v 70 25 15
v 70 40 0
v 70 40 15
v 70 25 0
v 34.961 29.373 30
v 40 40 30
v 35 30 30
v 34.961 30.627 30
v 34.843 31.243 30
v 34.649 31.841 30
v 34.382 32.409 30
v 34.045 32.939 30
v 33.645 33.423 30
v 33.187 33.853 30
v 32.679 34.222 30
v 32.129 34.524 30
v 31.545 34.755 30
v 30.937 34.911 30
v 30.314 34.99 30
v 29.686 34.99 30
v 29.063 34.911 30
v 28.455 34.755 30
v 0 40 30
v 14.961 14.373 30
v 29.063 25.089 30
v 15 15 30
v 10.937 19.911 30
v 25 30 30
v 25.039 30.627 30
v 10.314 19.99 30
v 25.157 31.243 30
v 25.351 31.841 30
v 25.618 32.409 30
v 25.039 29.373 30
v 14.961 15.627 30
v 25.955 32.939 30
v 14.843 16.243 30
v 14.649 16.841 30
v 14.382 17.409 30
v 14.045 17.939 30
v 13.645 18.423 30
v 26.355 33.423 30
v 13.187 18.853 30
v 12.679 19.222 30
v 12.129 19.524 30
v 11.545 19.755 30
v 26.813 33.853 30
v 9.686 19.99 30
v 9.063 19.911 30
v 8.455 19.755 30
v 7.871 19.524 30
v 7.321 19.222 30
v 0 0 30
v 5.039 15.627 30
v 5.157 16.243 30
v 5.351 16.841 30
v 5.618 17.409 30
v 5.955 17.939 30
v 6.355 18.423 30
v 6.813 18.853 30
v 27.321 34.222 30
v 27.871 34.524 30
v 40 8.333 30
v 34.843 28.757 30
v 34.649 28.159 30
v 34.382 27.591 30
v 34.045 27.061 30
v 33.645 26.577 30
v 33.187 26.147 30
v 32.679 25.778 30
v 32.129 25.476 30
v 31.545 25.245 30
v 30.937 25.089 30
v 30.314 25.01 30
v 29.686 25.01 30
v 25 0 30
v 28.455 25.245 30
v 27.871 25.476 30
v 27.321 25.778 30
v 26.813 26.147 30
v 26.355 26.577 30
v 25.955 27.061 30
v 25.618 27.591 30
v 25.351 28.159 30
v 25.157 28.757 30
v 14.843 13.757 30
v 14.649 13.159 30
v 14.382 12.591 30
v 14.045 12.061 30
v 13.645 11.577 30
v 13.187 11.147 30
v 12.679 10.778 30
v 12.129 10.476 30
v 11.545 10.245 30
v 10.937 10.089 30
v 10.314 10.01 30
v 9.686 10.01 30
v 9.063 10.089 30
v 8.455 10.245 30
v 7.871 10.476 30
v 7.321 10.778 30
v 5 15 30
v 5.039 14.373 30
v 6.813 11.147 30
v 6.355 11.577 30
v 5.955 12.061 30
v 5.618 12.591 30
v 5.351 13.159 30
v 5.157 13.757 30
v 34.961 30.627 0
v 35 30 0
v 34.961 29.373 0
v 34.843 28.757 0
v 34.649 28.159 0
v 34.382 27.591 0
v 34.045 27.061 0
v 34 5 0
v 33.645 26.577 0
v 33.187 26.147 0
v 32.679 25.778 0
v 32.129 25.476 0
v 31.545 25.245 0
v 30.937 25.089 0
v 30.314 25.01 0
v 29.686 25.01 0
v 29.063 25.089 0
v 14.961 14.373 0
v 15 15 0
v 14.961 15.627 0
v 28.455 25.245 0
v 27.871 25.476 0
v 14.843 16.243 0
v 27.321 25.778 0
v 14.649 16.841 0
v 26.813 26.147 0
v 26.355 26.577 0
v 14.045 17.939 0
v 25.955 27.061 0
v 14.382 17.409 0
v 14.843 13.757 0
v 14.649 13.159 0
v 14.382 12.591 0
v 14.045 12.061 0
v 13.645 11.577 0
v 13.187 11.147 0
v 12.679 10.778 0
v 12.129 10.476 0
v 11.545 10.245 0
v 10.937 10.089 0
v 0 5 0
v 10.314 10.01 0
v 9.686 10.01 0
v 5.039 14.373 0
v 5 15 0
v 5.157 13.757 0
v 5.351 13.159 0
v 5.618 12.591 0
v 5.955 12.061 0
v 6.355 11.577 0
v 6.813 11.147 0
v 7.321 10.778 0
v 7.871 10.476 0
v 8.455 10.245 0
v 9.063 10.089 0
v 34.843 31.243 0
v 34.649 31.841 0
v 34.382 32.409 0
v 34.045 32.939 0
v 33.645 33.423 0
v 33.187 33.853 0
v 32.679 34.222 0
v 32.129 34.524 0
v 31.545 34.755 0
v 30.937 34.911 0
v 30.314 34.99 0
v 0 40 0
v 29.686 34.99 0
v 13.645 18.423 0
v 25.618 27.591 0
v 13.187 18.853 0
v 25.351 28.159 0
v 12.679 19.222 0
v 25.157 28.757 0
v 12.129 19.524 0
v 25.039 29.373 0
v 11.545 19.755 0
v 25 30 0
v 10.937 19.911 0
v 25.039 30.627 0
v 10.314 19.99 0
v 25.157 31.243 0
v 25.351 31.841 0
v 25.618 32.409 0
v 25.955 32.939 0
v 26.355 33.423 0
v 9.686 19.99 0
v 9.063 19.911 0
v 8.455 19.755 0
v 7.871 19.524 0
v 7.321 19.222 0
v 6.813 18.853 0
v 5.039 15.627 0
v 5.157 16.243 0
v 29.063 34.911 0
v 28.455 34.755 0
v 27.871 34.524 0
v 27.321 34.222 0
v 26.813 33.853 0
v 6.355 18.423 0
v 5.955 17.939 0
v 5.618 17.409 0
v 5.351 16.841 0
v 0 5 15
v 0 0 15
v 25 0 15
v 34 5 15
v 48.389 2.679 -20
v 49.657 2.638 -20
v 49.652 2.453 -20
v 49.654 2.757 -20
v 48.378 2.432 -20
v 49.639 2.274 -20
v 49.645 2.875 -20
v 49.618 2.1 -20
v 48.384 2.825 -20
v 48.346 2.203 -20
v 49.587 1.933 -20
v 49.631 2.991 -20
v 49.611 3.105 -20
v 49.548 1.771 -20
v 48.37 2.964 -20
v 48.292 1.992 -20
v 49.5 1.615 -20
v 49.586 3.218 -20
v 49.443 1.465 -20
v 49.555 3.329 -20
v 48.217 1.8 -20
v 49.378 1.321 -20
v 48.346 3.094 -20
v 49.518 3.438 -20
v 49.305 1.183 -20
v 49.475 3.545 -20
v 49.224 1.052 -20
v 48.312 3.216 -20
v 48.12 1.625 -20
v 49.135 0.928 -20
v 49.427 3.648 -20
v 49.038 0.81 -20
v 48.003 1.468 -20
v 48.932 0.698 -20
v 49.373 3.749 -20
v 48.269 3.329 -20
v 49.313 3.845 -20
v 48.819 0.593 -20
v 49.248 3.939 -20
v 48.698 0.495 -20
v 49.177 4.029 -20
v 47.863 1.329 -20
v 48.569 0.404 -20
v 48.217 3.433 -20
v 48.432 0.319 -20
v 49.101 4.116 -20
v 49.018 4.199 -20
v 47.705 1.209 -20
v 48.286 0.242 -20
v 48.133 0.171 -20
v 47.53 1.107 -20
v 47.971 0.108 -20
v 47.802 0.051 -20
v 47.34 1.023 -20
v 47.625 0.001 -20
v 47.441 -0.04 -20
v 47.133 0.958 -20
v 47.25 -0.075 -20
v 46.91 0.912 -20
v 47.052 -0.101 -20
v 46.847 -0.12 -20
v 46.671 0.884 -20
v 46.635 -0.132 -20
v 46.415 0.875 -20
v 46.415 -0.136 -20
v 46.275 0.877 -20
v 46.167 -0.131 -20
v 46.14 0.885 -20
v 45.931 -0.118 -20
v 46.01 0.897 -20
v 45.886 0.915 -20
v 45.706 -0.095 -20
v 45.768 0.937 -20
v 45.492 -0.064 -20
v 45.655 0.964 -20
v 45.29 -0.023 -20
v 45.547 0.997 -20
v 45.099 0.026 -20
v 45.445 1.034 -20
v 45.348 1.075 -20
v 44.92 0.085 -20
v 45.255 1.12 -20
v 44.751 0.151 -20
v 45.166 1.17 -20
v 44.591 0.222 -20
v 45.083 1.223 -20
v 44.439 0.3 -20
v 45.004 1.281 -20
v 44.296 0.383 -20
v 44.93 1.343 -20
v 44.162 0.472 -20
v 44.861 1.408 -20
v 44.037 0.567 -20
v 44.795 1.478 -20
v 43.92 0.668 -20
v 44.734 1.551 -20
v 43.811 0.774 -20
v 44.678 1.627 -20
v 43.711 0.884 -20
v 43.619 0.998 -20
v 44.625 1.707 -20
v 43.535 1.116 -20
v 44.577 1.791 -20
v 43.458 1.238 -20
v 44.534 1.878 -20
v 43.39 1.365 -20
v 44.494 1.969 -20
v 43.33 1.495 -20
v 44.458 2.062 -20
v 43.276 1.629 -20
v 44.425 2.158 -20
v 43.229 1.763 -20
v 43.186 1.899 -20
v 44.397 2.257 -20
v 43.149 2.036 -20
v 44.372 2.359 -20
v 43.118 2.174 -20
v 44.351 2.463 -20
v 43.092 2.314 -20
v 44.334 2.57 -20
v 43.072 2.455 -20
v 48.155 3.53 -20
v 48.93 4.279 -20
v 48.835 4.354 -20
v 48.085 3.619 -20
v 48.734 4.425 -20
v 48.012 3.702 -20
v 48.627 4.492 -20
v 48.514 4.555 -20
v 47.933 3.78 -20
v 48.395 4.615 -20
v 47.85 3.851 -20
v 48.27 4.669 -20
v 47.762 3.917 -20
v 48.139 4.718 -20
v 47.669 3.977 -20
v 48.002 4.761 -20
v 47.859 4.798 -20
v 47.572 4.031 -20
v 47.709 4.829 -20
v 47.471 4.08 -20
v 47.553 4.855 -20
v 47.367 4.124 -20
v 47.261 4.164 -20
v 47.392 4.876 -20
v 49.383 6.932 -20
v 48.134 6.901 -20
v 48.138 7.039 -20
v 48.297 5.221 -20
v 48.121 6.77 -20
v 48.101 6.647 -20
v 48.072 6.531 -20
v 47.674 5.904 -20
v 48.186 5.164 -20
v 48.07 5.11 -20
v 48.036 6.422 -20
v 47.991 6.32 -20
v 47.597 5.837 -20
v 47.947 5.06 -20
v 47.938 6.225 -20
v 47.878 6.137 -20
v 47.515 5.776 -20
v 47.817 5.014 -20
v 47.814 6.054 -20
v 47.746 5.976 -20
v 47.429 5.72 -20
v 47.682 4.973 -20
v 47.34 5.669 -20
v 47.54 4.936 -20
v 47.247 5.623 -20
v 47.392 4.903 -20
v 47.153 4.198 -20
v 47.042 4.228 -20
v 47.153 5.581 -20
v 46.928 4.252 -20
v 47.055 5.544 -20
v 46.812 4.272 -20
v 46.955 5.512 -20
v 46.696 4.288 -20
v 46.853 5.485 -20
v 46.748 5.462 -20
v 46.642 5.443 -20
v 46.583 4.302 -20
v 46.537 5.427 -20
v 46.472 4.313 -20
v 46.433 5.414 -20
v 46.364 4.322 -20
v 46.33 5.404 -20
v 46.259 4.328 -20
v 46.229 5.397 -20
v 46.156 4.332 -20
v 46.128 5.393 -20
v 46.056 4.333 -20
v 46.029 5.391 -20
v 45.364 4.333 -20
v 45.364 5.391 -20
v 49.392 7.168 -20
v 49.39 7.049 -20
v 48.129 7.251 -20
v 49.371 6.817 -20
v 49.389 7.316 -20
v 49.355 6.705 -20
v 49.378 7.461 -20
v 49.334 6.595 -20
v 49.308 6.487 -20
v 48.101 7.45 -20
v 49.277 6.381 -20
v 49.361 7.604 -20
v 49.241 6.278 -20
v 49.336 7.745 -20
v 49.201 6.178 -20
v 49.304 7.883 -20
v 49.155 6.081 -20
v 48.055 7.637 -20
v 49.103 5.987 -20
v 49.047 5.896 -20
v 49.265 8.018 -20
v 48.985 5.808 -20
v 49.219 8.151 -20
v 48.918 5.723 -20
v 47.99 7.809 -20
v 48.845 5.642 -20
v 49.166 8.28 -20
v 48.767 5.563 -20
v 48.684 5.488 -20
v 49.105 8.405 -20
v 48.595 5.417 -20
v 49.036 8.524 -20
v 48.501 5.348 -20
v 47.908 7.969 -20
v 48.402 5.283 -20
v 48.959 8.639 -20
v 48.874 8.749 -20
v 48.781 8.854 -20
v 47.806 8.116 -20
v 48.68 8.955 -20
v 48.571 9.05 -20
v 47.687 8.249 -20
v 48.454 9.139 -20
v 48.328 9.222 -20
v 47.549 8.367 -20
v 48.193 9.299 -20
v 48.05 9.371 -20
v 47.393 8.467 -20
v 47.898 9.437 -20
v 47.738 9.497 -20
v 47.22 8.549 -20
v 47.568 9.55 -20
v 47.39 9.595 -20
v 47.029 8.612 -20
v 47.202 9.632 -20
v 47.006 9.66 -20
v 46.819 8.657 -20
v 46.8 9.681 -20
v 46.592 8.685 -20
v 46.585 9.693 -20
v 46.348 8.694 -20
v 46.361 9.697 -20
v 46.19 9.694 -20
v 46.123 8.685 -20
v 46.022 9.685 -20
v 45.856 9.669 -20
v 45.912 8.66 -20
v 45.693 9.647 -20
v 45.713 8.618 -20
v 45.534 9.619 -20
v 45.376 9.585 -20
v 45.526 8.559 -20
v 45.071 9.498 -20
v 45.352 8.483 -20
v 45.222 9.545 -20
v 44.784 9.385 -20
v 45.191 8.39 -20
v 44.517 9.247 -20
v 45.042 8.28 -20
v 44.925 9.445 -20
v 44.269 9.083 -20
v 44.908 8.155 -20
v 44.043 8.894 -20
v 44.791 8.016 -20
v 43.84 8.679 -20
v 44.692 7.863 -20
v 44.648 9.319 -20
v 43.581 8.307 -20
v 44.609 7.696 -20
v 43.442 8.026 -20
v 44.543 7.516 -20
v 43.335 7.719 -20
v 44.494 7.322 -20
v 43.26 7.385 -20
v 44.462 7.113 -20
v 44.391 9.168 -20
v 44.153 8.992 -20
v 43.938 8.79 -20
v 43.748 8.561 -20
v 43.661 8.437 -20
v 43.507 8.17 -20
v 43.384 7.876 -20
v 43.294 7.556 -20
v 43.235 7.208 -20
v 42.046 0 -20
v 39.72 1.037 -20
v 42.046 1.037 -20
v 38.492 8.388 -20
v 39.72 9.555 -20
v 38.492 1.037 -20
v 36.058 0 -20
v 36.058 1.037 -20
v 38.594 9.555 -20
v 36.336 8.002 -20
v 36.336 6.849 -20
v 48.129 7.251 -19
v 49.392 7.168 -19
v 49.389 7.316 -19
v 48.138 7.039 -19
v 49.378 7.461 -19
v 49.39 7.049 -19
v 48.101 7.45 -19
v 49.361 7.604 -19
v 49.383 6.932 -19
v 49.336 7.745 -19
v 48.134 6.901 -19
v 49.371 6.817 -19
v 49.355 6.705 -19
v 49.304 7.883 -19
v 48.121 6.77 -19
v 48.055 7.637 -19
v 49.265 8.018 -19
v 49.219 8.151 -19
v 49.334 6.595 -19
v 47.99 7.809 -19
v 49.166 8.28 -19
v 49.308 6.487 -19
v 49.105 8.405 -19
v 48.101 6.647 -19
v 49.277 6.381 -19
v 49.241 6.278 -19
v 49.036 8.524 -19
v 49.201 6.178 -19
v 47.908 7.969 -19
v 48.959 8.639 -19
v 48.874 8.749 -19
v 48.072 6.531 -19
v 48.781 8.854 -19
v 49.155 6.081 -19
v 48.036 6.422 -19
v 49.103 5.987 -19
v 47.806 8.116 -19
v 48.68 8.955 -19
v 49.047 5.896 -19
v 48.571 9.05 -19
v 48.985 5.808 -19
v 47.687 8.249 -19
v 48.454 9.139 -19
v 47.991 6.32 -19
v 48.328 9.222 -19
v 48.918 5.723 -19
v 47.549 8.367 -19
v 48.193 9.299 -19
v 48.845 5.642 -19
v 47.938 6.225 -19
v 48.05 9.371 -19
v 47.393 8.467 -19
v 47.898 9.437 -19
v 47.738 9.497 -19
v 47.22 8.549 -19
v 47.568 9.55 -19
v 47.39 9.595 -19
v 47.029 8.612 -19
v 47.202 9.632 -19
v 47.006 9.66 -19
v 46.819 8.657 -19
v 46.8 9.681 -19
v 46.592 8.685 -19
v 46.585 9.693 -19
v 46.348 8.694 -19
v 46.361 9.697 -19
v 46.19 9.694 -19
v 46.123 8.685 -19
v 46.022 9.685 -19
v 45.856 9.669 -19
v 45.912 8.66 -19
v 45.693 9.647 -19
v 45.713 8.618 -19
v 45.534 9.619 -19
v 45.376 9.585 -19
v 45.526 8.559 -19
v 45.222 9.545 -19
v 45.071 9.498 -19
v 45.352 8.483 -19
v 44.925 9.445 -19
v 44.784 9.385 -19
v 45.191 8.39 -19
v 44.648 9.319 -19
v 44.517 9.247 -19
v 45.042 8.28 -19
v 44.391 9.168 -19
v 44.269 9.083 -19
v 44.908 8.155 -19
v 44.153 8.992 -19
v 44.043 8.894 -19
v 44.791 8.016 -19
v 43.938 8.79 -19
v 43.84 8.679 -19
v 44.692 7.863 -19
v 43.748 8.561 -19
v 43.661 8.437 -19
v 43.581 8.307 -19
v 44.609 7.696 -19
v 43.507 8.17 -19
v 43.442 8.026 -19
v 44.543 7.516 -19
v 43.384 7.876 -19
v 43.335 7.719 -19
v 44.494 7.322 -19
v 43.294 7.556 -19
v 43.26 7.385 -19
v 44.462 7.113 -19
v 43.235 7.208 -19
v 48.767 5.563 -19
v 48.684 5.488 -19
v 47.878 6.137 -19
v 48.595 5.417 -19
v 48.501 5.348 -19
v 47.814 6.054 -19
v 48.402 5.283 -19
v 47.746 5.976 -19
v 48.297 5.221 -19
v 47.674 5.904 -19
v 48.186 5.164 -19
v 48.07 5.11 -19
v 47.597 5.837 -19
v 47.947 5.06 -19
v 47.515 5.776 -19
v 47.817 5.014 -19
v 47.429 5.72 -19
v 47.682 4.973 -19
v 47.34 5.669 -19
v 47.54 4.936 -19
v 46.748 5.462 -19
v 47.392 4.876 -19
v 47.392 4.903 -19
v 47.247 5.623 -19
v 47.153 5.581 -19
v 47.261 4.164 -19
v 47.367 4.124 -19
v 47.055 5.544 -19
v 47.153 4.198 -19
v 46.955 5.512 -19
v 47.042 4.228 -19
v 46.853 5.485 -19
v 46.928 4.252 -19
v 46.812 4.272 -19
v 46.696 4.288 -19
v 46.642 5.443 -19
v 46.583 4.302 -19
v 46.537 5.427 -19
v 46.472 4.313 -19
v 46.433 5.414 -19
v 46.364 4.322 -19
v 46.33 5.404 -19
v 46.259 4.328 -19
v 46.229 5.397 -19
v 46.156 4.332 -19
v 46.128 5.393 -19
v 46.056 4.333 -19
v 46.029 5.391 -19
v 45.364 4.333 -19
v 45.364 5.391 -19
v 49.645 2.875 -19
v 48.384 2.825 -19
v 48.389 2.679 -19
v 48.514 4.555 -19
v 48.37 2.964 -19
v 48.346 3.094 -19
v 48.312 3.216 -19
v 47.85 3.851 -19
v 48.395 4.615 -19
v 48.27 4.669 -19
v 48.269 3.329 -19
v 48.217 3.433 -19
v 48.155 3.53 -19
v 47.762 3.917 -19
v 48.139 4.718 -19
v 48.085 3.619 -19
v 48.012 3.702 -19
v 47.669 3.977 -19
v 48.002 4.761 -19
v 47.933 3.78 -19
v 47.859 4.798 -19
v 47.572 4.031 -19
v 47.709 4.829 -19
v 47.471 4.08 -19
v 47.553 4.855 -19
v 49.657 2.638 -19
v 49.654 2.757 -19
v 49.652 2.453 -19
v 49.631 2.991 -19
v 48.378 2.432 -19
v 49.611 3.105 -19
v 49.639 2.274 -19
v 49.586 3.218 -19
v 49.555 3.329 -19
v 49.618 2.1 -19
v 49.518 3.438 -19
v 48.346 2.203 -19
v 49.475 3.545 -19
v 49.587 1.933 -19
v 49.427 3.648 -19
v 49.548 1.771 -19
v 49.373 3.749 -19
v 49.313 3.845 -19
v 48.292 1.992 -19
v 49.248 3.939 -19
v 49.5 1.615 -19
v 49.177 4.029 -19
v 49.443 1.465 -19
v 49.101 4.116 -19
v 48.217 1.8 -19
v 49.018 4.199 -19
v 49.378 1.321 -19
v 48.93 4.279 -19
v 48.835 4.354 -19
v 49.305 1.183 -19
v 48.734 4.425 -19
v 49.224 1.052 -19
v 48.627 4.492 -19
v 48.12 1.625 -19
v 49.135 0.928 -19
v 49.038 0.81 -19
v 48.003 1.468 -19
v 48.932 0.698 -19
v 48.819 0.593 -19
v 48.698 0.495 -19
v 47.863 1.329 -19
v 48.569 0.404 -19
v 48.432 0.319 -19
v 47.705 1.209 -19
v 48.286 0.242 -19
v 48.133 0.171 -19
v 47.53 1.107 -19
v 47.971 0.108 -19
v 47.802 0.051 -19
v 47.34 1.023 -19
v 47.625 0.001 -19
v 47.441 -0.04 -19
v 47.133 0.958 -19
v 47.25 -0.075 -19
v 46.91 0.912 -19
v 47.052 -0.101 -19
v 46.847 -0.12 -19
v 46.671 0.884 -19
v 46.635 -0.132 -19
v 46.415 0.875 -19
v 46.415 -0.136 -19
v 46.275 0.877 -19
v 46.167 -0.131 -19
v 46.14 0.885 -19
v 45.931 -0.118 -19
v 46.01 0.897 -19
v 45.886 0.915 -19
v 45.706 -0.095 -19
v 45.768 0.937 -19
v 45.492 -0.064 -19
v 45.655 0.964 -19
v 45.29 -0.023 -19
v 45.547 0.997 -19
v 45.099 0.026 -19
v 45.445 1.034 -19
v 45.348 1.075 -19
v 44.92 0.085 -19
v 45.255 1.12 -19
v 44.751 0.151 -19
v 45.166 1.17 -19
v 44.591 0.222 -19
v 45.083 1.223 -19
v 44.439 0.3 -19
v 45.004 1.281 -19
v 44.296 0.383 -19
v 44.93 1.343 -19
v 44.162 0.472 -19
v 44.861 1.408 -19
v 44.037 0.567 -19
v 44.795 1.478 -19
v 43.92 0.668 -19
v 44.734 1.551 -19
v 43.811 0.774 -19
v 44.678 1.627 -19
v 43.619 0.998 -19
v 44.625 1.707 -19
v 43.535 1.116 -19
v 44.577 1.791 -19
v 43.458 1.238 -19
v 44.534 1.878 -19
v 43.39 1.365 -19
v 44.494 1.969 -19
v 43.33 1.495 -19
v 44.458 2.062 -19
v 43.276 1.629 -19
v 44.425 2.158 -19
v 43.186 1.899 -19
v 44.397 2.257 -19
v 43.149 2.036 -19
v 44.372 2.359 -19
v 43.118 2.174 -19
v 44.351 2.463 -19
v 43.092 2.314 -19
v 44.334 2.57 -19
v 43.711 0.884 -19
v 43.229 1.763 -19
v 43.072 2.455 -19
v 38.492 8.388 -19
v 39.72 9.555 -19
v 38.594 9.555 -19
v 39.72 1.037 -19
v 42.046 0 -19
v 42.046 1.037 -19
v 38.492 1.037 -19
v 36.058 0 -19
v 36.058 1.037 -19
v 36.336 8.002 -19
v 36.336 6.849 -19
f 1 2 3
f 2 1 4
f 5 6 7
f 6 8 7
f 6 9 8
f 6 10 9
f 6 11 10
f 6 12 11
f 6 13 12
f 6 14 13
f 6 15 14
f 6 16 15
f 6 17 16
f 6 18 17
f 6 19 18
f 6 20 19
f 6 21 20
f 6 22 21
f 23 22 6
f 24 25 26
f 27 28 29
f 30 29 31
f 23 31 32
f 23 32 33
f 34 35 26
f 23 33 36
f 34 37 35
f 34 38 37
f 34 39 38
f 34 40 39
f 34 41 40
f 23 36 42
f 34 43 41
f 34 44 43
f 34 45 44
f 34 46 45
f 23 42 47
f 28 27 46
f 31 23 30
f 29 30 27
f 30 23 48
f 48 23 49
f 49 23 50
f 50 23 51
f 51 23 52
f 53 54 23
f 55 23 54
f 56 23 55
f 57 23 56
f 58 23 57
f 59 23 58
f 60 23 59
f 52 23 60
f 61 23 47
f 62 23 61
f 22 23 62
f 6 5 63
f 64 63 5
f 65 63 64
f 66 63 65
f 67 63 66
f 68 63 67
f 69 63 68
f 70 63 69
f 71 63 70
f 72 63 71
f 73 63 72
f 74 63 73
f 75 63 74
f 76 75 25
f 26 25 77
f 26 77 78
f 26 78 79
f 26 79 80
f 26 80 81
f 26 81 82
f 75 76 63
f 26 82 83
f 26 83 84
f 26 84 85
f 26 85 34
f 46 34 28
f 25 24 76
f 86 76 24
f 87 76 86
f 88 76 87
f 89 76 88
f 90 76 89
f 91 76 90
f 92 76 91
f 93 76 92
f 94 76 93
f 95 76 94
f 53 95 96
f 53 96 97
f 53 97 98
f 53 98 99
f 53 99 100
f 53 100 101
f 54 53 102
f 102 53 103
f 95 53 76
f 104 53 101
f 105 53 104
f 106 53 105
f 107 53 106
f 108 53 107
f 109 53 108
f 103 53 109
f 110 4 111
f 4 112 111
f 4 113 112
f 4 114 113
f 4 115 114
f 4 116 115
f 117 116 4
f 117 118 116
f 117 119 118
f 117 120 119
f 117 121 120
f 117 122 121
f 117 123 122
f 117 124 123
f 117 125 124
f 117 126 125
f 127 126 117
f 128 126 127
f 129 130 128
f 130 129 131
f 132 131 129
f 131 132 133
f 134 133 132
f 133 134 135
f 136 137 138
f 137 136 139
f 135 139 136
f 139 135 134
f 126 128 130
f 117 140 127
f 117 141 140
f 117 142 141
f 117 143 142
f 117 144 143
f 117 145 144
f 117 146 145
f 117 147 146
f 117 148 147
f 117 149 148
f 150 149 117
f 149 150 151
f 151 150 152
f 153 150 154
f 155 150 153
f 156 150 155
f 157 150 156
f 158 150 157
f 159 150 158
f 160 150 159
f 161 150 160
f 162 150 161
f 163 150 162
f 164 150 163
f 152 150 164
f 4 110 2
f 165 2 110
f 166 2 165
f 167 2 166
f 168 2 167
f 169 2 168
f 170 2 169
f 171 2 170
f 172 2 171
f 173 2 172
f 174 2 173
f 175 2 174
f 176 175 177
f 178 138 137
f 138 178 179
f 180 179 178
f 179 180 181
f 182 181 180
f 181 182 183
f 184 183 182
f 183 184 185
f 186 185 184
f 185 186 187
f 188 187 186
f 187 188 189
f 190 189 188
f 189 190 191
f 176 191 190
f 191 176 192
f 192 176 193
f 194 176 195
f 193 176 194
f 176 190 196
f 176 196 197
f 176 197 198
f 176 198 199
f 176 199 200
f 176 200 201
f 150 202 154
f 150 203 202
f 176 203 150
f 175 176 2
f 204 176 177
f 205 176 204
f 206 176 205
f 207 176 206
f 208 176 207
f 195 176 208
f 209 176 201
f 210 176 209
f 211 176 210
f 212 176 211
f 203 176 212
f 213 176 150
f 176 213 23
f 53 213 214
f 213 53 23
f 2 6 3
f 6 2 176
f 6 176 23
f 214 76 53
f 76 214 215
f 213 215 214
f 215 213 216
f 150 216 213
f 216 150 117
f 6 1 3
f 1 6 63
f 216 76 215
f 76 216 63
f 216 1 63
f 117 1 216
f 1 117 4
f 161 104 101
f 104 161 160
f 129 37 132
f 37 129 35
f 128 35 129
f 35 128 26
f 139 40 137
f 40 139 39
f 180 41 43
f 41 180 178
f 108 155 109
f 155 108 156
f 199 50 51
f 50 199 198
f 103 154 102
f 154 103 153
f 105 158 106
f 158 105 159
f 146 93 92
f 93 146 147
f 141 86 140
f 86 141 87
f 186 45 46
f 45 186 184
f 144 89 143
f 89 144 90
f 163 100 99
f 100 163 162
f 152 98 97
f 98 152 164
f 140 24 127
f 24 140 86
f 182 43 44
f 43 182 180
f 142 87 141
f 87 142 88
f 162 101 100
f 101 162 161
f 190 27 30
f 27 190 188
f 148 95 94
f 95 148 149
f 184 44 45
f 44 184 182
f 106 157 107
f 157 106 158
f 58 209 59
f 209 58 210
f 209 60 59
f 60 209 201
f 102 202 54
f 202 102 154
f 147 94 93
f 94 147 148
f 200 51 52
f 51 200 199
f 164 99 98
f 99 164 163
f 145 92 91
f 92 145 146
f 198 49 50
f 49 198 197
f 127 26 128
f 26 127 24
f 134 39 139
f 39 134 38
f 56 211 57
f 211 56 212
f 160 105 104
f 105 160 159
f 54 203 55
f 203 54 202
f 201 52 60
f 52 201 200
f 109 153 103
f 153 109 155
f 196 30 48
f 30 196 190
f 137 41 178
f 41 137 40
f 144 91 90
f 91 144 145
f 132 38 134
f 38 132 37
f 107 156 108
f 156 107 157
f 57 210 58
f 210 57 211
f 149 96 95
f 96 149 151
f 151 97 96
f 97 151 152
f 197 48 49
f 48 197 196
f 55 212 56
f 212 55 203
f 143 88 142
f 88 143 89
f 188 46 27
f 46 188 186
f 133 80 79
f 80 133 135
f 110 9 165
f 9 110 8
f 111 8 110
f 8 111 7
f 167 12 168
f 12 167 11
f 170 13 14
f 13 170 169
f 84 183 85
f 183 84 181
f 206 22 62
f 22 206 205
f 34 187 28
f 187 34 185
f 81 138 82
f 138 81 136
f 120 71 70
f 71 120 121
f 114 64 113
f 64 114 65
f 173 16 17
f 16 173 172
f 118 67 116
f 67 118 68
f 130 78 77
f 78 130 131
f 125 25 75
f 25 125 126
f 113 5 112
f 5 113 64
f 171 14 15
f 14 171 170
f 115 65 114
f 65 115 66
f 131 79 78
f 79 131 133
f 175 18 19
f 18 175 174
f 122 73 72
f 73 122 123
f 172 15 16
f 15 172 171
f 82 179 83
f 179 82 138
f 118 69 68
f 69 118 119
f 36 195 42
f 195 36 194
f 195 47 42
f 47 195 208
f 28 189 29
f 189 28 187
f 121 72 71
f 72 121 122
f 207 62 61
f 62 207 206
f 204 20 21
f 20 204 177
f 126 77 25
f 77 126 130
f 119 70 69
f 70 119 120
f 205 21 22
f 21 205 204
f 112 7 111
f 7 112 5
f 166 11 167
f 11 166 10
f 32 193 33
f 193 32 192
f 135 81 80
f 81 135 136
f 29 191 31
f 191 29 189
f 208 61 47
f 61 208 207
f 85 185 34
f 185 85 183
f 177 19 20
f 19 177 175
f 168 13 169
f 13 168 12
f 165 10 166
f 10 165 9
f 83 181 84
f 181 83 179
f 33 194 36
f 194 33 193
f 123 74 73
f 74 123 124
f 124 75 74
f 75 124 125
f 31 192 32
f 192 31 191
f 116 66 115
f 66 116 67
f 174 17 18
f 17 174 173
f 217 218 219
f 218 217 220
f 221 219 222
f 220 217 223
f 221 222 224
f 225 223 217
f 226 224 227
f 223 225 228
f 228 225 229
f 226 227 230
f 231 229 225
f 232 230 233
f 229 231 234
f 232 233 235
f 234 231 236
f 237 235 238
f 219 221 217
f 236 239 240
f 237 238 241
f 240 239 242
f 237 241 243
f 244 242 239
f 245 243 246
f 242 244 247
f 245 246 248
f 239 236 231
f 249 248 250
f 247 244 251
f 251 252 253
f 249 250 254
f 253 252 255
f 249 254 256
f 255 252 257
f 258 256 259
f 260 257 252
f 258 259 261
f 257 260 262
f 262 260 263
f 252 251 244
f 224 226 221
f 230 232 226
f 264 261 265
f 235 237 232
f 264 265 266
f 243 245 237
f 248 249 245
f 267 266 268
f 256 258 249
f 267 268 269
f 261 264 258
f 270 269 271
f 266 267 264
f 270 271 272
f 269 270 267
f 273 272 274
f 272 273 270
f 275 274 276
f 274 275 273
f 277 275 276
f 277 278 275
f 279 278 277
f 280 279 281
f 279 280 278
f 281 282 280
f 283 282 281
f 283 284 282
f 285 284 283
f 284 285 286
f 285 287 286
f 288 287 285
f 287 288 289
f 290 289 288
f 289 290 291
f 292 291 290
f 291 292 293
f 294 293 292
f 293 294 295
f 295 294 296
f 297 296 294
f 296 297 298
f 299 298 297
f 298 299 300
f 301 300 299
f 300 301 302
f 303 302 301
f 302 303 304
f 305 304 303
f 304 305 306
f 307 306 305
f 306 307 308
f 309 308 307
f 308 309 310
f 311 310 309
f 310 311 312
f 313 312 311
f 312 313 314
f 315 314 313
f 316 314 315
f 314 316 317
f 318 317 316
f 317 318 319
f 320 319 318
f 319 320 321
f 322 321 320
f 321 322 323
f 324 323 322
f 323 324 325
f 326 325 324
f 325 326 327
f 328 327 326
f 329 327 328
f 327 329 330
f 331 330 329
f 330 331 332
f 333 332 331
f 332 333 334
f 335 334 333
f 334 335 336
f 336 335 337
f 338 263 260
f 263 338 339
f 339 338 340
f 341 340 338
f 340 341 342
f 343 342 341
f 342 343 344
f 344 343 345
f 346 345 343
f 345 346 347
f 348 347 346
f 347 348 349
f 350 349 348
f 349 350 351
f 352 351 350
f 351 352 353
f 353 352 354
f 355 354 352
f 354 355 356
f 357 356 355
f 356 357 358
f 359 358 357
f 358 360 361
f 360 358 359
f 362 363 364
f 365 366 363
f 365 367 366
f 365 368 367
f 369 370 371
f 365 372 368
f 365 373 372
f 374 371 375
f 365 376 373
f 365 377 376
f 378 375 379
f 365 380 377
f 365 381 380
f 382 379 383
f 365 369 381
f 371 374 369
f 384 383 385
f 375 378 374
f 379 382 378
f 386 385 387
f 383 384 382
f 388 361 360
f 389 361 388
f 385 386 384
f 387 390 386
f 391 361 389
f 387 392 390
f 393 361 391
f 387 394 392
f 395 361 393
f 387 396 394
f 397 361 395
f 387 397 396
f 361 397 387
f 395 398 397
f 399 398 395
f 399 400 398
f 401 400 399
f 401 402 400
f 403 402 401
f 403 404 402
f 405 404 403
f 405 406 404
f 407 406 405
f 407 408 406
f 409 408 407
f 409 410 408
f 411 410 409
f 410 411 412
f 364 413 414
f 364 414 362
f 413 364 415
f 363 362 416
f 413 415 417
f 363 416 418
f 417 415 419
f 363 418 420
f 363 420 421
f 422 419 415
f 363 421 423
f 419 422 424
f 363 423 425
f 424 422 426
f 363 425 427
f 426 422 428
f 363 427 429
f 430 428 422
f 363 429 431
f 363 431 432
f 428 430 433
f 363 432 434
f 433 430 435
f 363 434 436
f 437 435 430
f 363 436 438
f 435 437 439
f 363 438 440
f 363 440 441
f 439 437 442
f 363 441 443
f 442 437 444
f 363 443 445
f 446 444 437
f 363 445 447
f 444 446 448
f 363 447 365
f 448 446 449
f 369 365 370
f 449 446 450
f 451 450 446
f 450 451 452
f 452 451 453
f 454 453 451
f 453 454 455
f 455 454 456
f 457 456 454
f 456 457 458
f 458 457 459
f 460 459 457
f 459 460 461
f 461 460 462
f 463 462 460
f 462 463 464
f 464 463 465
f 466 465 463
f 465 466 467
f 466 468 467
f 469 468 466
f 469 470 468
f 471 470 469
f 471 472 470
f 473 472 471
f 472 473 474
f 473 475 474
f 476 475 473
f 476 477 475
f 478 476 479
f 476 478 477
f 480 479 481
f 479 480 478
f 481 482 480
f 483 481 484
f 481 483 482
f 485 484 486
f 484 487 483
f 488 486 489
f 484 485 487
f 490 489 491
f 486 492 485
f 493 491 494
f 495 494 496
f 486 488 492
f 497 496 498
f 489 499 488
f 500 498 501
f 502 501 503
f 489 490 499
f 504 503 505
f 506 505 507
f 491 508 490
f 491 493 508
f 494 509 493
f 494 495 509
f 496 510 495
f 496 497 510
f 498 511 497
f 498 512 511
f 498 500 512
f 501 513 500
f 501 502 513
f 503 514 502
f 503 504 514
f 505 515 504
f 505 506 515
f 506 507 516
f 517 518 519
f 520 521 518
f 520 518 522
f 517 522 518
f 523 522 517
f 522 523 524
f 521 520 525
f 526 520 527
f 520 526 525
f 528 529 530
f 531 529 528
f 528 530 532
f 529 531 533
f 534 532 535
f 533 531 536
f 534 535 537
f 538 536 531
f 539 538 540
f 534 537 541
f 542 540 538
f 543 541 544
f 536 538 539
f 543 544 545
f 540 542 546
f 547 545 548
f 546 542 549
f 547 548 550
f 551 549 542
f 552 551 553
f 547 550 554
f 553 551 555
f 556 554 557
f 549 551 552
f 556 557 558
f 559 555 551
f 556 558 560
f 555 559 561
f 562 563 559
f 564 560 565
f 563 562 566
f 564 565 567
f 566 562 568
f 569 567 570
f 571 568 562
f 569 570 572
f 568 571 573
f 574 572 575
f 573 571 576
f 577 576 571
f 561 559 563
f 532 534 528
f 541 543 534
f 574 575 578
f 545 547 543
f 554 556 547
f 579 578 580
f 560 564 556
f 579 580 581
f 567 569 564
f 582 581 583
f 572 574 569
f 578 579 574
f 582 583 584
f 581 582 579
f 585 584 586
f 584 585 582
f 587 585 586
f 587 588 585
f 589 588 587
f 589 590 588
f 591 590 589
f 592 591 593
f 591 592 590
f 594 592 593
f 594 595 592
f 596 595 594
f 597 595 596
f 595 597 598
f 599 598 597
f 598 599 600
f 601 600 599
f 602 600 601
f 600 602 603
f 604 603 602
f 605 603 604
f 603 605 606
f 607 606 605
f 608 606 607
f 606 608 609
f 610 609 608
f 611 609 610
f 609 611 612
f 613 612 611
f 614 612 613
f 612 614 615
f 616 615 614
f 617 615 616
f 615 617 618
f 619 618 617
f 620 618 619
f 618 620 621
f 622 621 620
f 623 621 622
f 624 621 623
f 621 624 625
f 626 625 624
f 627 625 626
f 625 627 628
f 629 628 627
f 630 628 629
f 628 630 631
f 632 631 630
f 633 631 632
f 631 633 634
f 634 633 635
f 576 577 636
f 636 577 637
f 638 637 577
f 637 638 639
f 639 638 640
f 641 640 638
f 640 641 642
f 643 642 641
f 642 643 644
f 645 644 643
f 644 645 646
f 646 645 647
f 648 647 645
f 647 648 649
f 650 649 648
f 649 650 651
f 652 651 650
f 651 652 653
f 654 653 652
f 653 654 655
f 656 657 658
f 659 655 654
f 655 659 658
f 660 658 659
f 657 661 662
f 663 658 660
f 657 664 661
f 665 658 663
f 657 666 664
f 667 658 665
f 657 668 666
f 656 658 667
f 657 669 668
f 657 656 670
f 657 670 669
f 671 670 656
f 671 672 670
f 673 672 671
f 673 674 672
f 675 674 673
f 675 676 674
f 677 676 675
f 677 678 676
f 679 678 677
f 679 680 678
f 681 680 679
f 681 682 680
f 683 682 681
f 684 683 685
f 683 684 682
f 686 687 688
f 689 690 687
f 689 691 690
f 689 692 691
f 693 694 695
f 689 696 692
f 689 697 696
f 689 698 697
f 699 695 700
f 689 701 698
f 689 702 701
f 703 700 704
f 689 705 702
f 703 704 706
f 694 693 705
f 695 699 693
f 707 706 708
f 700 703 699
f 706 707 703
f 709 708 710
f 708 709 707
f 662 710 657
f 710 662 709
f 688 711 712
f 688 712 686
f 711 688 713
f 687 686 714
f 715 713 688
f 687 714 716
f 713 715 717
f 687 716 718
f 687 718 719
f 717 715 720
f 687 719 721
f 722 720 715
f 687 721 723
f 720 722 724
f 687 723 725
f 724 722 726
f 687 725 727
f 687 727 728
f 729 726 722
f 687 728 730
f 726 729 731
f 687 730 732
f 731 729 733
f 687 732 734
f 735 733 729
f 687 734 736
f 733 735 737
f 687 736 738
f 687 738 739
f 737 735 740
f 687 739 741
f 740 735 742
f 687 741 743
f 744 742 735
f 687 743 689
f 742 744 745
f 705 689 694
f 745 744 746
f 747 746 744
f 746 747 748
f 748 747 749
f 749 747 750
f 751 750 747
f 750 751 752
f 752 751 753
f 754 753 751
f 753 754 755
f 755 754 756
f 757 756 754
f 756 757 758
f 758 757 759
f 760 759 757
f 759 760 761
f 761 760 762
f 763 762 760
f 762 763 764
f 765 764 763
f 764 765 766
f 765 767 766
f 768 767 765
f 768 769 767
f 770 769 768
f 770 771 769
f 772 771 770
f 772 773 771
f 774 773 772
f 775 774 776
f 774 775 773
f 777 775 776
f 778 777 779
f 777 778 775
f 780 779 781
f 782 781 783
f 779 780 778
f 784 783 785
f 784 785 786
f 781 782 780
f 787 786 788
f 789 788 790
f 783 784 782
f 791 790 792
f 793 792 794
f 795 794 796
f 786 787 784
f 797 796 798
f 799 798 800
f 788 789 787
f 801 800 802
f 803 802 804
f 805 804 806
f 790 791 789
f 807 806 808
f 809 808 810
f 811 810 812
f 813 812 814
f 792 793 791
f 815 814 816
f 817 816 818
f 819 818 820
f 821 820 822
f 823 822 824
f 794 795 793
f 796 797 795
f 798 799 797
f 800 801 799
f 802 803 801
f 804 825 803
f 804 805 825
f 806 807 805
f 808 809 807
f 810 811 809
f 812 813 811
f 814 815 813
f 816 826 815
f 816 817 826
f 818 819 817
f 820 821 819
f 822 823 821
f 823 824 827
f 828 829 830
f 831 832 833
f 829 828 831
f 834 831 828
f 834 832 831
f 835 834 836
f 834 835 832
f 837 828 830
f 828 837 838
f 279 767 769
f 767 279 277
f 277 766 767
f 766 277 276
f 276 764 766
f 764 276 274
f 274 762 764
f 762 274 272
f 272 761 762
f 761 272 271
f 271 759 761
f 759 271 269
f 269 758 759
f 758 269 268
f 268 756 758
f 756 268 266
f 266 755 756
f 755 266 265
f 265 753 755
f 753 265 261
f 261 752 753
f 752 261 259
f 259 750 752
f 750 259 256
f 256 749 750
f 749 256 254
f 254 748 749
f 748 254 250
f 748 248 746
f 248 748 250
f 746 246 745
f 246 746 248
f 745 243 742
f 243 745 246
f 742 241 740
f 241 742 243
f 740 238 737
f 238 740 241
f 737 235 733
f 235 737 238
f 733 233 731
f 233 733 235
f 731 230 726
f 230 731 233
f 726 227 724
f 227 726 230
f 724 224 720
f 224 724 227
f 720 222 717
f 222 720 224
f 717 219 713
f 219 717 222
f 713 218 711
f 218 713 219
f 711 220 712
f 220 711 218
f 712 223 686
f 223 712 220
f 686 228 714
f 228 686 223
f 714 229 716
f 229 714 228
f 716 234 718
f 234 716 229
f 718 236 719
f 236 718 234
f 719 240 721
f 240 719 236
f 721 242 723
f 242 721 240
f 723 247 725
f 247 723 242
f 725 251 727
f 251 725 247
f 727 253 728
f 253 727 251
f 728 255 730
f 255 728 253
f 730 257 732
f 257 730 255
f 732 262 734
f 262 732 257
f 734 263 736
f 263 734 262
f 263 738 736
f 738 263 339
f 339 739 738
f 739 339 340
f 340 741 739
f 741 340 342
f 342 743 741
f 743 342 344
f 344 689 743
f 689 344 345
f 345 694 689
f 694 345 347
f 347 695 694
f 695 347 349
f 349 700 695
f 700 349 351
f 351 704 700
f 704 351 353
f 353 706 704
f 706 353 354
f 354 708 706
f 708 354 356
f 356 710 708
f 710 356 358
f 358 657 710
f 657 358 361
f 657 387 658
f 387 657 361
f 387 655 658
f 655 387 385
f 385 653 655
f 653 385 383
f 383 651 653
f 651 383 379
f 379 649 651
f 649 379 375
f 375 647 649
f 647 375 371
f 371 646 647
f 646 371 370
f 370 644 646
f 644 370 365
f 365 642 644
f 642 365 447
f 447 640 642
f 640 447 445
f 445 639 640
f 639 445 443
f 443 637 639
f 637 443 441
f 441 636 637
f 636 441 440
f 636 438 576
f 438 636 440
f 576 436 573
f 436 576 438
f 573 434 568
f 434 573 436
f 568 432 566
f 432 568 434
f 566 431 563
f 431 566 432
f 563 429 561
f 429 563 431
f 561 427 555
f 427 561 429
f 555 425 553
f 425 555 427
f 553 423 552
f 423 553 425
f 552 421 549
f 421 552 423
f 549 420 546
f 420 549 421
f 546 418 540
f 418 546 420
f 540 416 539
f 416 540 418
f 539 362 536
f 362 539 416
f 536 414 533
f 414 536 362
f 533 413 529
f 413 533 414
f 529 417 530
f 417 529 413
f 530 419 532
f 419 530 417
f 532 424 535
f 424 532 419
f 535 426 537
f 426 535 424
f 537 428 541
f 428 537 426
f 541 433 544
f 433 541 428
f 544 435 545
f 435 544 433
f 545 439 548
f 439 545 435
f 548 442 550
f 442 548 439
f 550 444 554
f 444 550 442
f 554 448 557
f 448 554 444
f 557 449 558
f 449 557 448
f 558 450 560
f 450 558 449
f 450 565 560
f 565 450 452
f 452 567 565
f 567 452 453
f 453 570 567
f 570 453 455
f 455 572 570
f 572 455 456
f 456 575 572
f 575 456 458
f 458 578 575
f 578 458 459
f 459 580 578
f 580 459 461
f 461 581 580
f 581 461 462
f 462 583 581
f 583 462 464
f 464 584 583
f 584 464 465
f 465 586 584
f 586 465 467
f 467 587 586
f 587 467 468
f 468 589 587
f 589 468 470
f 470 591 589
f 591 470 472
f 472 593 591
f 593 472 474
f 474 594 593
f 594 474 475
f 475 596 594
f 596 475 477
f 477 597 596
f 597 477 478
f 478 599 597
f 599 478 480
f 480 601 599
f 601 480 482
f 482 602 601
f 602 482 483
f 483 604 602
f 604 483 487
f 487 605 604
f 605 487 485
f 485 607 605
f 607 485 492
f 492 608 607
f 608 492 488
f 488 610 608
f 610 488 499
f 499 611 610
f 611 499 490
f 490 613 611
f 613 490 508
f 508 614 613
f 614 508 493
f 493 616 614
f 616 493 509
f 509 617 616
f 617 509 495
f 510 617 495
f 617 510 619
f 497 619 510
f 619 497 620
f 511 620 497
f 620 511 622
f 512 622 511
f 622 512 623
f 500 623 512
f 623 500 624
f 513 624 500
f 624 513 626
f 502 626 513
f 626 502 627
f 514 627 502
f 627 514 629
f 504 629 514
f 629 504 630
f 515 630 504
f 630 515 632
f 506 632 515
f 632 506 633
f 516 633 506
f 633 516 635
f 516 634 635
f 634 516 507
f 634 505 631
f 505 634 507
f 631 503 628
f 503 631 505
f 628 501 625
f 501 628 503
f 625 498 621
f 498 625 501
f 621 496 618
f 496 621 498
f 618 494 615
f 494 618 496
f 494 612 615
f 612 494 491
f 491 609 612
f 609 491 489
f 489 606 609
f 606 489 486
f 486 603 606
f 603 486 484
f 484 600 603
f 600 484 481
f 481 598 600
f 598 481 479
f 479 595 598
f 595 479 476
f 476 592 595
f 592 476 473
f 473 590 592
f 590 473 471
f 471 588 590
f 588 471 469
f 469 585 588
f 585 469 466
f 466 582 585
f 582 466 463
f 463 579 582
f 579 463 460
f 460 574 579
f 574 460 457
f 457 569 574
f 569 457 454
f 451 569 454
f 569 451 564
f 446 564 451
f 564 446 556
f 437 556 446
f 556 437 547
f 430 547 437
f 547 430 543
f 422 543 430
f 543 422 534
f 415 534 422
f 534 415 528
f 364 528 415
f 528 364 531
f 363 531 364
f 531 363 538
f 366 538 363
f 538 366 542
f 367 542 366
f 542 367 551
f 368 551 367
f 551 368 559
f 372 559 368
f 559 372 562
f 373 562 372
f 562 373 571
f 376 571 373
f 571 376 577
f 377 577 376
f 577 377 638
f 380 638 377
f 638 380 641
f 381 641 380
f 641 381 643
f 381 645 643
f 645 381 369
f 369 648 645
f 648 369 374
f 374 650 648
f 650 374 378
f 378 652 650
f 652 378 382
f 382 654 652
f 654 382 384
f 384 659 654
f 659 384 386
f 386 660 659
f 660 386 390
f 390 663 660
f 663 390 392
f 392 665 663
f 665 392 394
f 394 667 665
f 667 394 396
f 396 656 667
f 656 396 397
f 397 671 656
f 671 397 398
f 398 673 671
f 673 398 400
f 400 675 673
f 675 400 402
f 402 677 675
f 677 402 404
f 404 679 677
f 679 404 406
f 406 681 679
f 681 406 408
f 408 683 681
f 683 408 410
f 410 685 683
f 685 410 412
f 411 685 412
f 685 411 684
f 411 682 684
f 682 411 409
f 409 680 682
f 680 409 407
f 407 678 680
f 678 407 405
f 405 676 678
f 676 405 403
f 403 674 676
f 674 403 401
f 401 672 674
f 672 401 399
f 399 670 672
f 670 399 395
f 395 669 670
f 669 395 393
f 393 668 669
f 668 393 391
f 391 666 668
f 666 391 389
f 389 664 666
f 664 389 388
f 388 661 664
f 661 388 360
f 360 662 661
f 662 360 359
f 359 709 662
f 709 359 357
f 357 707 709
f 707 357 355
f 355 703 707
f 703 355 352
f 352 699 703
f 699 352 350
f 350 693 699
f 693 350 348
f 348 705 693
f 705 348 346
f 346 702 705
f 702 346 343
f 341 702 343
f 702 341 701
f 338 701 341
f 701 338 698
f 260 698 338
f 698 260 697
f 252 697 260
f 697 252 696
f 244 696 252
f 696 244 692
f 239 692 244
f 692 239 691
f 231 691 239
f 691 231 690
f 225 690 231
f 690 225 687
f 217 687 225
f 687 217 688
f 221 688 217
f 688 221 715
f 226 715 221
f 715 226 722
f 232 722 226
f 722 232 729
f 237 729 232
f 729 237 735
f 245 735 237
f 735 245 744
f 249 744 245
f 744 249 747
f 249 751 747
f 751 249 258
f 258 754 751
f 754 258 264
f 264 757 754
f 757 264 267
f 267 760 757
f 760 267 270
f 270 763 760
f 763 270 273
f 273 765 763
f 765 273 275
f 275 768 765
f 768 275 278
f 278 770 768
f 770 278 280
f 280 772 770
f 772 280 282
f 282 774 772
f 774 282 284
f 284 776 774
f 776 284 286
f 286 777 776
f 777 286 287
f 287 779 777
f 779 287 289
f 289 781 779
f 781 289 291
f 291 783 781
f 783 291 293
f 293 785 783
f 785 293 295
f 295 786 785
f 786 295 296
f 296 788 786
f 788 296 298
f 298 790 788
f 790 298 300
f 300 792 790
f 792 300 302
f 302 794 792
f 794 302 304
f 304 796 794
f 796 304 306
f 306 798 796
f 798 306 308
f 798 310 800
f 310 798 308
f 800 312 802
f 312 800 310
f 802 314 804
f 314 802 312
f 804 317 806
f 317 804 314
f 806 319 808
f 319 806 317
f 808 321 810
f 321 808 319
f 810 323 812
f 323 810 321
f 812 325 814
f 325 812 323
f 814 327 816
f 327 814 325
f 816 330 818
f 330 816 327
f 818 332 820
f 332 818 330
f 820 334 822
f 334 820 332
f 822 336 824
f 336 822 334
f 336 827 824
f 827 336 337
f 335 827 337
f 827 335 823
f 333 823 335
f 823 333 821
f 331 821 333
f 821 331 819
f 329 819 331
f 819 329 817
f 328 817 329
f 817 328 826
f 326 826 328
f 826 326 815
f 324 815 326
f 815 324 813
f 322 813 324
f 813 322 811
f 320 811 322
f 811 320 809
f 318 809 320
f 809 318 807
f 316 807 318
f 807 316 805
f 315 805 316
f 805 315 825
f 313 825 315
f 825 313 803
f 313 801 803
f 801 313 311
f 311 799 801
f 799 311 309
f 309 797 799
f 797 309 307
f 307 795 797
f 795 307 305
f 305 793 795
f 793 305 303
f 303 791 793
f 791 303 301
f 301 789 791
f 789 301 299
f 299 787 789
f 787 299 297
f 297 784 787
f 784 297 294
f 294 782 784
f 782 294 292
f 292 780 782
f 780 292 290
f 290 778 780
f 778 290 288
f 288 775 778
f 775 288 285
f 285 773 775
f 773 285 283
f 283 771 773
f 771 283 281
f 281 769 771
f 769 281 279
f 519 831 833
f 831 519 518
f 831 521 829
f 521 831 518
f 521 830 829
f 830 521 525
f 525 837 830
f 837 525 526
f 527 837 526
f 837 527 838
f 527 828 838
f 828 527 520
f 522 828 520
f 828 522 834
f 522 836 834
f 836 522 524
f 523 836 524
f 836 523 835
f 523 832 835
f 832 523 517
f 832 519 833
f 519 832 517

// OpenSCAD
$fn=50;

cw=70;
cd=40;
ch=30;
cy=10;

difference() {
    cube([cw,cd,ch]);
    cube([cw,5,15]);
    polyhedron(
        points=[ [40,0,ch],
                 [40,cd,ch],
                 [cw,cd,ch],
                 [cw,0,ch],
                 [cw,0,15],
                 [cw,cd,15]],
        faces=[  [0,1,2],
                 [0,2,3],
                 [0,3,4],
                 [0,4,5],
                 [1,0,5],
                 [1,5,2],
                 [2,5,4],
                 [4,3,2]]);
    linear_extrude(height=ch)
    polygon([
             [25,0],
             [cw,0],
             [cw,cd-15]]);
    translate([10,15,0])
    cylinder(h=ch,d=cy);
    translate([30,30,0])
    cylinder(h=ch,d=cy);
}
translate([cw/2,0,-20])
linear_extrude(height=1)
text("13");
